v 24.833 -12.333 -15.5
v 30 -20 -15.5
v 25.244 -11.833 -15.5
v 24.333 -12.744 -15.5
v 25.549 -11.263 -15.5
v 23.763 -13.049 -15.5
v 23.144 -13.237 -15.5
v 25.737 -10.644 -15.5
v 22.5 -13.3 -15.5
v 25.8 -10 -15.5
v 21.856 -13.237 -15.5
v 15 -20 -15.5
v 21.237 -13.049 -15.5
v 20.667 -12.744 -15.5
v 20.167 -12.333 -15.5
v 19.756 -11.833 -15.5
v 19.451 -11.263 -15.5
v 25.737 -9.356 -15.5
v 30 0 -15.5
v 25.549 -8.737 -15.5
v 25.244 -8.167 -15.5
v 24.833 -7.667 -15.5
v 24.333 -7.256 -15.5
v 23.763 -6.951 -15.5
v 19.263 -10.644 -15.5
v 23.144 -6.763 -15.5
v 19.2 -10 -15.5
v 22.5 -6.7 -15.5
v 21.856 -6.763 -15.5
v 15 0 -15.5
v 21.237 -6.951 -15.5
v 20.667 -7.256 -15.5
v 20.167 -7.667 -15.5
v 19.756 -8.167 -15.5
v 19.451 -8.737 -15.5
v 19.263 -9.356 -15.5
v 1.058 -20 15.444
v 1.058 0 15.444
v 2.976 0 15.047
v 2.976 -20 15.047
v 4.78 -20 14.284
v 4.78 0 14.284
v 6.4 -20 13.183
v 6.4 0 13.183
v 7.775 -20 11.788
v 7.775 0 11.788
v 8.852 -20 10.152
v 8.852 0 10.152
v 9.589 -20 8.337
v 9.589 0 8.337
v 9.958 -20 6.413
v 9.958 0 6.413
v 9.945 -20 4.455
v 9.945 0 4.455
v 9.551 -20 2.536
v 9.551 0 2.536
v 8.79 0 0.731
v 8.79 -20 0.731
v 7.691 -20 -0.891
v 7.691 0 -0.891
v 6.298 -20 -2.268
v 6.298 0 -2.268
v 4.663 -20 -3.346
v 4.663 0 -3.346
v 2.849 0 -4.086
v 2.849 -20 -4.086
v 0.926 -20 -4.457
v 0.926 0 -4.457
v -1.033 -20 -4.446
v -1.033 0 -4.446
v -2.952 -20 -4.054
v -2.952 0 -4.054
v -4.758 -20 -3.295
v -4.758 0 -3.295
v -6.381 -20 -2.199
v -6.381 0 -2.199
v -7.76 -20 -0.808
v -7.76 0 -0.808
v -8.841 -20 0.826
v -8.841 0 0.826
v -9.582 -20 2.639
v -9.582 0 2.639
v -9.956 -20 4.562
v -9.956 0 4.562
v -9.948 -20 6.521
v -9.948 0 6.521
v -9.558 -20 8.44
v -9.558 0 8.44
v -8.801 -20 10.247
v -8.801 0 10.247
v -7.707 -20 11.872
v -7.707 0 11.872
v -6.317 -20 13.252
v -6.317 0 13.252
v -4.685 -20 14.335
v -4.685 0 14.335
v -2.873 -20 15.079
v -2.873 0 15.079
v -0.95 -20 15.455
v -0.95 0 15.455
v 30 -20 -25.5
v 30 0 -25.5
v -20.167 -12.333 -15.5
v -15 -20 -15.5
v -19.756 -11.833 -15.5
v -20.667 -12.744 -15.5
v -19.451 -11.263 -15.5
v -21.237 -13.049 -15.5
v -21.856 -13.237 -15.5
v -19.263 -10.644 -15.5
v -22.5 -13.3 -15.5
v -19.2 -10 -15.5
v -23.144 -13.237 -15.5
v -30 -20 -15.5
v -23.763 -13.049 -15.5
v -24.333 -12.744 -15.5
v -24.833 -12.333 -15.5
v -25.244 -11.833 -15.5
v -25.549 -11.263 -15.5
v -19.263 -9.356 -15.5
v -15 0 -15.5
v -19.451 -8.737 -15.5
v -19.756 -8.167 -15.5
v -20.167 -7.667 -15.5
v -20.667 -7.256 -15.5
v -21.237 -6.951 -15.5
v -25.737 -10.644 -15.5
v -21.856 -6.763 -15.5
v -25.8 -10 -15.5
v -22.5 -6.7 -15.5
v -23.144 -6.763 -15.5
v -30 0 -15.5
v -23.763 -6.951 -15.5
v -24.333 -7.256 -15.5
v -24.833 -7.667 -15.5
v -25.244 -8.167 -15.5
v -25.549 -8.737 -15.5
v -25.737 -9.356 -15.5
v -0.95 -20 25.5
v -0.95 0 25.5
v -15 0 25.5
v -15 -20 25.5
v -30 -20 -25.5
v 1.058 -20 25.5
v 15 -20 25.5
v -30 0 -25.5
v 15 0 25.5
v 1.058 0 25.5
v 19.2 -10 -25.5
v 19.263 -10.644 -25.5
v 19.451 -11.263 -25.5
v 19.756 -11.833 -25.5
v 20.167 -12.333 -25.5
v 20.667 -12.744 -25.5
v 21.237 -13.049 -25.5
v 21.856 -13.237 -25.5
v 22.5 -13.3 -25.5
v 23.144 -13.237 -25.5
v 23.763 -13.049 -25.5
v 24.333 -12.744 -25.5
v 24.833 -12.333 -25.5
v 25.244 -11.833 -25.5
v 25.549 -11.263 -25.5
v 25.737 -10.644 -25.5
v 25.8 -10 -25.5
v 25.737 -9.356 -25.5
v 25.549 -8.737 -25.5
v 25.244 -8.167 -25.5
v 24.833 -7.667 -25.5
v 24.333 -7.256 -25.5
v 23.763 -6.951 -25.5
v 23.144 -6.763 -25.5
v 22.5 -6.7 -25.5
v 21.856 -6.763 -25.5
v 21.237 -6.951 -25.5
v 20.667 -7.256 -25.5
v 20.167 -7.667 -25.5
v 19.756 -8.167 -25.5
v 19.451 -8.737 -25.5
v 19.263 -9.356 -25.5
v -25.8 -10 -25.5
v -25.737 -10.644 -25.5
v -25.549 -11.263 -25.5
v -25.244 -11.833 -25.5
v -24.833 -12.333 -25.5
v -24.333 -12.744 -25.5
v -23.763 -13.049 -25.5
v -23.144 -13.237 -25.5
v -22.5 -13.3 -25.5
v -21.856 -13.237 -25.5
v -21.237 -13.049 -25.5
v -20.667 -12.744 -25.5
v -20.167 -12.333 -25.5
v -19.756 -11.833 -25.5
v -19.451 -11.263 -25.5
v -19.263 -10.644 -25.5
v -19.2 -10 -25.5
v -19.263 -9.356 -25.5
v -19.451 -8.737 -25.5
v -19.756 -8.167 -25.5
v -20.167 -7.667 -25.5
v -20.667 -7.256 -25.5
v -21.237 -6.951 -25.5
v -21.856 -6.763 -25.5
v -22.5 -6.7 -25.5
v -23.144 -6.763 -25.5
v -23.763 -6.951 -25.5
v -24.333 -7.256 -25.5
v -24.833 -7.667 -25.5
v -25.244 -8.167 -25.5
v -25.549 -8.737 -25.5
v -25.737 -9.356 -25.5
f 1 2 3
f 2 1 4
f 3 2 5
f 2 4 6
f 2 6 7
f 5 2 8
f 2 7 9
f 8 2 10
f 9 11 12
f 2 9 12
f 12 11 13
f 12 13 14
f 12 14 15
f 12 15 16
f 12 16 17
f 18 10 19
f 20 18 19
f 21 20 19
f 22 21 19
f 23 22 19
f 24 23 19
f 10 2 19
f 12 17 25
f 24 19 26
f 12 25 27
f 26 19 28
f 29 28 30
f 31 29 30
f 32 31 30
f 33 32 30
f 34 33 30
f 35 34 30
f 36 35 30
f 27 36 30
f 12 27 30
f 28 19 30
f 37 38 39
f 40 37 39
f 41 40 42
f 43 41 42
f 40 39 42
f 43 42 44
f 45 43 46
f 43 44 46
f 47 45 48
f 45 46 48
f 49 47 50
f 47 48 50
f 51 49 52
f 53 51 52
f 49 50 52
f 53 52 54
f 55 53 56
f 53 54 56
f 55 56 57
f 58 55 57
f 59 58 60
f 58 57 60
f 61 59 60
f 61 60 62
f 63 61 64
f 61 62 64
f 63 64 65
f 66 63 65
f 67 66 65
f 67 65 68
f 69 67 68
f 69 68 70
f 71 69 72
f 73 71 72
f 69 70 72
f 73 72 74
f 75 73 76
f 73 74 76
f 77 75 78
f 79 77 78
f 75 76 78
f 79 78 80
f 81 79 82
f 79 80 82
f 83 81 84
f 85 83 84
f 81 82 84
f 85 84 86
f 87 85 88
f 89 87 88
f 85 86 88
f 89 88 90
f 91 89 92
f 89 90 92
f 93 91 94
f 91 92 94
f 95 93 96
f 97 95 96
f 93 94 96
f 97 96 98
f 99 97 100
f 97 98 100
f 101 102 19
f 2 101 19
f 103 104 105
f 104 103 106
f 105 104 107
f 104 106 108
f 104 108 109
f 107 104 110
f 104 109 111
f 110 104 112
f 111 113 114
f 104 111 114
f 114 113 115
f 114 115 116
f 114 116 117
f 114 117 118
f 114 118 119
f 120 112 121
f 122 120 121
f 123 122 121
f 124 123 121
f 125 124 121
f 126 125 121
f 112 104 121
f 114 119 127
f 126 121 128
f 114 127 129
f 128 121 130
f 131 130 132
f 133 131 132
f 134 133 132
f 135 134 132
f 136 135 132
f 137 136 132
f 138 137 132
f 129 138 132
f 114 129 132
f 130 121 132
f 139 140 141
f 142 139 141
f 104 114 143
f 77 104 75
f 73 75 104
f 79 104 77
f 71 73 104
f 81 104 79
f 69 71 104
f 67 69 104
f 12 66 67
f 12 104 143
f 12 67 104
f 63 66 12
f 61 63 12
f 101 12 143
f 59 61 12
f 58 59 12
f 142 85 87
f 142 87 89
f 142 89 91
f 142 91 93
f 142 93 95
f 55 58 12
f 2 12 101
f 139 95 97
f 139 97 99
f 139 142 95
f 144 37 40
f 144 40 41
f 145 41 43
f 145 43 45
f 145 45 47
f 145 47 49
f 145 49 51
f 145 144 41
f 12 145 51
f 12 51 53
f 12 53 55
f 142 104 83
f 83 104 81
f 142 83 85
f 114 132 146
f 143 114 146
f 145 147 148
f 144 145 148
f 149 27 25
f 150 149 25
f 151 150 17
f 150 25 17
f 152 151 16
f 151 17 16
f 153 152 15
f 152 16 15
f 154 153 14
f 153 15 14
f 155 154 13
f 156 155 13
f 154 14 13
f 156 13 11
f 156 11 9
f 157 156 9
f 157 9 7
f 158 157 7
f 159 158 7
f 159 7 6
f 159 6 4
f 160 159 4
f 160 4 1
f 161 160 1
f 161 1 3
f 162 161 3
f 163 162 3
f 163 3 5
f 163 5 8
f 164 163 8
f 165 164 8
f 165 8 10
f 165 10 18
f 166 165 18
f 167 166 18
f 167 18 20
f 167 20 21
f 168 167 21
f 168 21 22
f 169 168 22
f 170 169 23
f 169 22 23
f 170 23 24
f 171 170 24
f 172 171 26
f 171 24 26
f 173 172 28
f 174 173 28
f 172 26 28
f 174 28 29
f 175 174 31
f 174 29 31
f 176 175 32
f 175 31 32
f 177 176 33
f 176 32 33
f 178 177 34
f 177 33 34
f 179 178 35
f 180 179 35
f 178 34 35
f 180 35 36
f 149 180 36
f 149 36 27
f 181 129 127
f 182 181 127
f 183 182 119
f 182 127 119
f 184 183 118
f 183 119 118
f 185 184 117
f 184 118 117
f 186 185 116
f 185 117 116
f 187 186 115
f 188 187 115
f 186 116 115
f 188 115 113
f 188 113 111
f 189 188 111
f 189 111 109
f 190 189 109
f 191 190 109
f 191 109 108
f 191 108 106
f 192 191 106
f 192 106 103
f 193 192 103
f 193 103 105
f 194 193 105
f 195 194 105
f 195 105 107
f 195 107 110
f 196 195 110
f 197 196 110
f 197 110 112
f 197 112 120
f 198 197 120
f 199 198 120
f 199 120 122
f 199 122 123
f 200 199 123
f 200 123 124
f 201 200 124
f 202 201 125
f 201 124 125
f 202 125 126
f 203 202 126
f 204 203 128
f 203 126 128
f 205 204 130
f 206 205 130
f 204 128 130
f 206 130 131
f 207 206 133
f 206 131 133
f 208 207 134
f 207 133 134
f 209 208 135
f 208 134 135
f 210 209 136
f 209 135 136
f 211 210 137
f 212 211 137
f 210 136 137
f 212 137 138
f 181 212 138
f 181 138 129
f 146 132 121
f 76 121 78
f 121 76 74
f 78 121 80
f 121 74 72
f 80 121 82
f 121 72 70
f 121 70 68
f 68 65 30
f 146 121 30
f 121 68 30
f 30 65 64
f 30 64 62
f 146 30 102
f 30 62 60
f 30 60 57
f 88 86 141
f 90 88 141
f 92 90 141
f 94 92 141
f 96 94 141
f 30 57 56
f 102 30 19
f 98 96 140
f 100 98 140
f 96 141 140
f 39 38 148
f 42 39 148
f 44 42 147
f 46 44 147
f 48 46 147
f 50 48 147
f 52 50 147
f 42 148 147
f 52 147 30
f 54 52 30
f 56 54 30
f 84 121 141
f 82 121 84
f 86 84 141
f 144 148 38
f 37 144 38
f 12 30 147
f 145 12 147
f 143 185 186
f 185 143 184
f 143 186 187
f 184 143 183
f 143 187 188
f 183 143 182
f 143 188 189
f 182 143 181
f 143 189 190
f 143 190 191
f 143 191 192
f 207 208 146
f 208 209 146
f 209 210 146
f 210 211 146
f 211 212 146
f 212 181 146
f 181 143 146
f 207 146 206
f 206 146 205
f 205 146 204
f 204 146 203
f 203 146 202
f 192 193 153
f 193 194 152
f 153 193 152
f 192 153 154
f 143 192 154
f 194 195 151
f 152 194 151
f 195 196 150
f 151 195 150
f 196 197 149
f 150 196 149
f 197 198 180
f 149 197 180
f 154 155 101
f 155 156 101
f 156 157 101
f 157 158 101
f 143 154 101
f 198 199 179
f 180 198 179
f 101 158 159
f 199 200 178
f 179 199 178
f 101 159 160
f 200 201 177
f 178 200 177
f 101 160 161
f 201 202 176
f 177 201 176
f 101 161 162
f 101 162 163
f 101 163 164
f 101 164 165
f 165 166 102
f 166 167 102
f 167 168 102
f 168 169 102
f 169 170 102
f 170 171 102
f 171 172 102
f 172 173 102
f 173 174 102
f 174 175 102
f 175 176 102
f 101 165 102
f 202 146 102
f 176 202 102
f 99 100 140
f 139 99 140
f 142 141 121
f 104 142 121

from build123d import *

# Parameters (mm, degrees)
F1_DEPTH = 20
F3_D     = 6.6
F4_D     = 6.6


with BuildPart() as f1:
    # F0 (on Front) → F1 (new body)
    with BuildSketch(Plane.XZ):
        with BuildLine():
            Line((-30, -25.5), (30, -25.5))
            Line((30, -25.5), (30, -15.5))
            Line((30, -15.5), (15, -15.5))
            Line((15, -15.5), (15, 25.5))
            Line((15, 25.5), (1.057532, 25.5))
            Line((1.057532, 25.5), (1.057532, 15.443924))
            ThreePointArc((1.057532, 15.443924), (-0.053951, -4.499854), (-0.950175, 15.454756))
            Line((-0.950175, 15.454756), (-0.950175, 25.5))
            Line((-0.950175, 25.5), (-15, 25.5))
            Line((-15, 25.5), (-15, -10.487244))
            Line((-15, -10.487244), (-15, -15.5))
            Line((-15, -15.5), (-30, -15.5))
            Line((-30, -15.5), (-30, -25.5))
        make_face()
    extrude(amount=F1_DEPTH)

    # F3 (through all)
    with Locations(Plane(origin=(0, 0, -25.5), x_dir=(1, 0, 0), z_dir=(0, 0, -1))):
        with Locations((-22.5, 10)):
            Hole(F3_D / 2)

    # F4 (through all)
    with Locations(Plane(origin=(0, 0, -25.5), x_dir=(1, 0, 0), z_dir=(0, 0, -1))):
        with Locations((22.5, 10)):
            Hole(F4_D / 2)


solid = f1.part
